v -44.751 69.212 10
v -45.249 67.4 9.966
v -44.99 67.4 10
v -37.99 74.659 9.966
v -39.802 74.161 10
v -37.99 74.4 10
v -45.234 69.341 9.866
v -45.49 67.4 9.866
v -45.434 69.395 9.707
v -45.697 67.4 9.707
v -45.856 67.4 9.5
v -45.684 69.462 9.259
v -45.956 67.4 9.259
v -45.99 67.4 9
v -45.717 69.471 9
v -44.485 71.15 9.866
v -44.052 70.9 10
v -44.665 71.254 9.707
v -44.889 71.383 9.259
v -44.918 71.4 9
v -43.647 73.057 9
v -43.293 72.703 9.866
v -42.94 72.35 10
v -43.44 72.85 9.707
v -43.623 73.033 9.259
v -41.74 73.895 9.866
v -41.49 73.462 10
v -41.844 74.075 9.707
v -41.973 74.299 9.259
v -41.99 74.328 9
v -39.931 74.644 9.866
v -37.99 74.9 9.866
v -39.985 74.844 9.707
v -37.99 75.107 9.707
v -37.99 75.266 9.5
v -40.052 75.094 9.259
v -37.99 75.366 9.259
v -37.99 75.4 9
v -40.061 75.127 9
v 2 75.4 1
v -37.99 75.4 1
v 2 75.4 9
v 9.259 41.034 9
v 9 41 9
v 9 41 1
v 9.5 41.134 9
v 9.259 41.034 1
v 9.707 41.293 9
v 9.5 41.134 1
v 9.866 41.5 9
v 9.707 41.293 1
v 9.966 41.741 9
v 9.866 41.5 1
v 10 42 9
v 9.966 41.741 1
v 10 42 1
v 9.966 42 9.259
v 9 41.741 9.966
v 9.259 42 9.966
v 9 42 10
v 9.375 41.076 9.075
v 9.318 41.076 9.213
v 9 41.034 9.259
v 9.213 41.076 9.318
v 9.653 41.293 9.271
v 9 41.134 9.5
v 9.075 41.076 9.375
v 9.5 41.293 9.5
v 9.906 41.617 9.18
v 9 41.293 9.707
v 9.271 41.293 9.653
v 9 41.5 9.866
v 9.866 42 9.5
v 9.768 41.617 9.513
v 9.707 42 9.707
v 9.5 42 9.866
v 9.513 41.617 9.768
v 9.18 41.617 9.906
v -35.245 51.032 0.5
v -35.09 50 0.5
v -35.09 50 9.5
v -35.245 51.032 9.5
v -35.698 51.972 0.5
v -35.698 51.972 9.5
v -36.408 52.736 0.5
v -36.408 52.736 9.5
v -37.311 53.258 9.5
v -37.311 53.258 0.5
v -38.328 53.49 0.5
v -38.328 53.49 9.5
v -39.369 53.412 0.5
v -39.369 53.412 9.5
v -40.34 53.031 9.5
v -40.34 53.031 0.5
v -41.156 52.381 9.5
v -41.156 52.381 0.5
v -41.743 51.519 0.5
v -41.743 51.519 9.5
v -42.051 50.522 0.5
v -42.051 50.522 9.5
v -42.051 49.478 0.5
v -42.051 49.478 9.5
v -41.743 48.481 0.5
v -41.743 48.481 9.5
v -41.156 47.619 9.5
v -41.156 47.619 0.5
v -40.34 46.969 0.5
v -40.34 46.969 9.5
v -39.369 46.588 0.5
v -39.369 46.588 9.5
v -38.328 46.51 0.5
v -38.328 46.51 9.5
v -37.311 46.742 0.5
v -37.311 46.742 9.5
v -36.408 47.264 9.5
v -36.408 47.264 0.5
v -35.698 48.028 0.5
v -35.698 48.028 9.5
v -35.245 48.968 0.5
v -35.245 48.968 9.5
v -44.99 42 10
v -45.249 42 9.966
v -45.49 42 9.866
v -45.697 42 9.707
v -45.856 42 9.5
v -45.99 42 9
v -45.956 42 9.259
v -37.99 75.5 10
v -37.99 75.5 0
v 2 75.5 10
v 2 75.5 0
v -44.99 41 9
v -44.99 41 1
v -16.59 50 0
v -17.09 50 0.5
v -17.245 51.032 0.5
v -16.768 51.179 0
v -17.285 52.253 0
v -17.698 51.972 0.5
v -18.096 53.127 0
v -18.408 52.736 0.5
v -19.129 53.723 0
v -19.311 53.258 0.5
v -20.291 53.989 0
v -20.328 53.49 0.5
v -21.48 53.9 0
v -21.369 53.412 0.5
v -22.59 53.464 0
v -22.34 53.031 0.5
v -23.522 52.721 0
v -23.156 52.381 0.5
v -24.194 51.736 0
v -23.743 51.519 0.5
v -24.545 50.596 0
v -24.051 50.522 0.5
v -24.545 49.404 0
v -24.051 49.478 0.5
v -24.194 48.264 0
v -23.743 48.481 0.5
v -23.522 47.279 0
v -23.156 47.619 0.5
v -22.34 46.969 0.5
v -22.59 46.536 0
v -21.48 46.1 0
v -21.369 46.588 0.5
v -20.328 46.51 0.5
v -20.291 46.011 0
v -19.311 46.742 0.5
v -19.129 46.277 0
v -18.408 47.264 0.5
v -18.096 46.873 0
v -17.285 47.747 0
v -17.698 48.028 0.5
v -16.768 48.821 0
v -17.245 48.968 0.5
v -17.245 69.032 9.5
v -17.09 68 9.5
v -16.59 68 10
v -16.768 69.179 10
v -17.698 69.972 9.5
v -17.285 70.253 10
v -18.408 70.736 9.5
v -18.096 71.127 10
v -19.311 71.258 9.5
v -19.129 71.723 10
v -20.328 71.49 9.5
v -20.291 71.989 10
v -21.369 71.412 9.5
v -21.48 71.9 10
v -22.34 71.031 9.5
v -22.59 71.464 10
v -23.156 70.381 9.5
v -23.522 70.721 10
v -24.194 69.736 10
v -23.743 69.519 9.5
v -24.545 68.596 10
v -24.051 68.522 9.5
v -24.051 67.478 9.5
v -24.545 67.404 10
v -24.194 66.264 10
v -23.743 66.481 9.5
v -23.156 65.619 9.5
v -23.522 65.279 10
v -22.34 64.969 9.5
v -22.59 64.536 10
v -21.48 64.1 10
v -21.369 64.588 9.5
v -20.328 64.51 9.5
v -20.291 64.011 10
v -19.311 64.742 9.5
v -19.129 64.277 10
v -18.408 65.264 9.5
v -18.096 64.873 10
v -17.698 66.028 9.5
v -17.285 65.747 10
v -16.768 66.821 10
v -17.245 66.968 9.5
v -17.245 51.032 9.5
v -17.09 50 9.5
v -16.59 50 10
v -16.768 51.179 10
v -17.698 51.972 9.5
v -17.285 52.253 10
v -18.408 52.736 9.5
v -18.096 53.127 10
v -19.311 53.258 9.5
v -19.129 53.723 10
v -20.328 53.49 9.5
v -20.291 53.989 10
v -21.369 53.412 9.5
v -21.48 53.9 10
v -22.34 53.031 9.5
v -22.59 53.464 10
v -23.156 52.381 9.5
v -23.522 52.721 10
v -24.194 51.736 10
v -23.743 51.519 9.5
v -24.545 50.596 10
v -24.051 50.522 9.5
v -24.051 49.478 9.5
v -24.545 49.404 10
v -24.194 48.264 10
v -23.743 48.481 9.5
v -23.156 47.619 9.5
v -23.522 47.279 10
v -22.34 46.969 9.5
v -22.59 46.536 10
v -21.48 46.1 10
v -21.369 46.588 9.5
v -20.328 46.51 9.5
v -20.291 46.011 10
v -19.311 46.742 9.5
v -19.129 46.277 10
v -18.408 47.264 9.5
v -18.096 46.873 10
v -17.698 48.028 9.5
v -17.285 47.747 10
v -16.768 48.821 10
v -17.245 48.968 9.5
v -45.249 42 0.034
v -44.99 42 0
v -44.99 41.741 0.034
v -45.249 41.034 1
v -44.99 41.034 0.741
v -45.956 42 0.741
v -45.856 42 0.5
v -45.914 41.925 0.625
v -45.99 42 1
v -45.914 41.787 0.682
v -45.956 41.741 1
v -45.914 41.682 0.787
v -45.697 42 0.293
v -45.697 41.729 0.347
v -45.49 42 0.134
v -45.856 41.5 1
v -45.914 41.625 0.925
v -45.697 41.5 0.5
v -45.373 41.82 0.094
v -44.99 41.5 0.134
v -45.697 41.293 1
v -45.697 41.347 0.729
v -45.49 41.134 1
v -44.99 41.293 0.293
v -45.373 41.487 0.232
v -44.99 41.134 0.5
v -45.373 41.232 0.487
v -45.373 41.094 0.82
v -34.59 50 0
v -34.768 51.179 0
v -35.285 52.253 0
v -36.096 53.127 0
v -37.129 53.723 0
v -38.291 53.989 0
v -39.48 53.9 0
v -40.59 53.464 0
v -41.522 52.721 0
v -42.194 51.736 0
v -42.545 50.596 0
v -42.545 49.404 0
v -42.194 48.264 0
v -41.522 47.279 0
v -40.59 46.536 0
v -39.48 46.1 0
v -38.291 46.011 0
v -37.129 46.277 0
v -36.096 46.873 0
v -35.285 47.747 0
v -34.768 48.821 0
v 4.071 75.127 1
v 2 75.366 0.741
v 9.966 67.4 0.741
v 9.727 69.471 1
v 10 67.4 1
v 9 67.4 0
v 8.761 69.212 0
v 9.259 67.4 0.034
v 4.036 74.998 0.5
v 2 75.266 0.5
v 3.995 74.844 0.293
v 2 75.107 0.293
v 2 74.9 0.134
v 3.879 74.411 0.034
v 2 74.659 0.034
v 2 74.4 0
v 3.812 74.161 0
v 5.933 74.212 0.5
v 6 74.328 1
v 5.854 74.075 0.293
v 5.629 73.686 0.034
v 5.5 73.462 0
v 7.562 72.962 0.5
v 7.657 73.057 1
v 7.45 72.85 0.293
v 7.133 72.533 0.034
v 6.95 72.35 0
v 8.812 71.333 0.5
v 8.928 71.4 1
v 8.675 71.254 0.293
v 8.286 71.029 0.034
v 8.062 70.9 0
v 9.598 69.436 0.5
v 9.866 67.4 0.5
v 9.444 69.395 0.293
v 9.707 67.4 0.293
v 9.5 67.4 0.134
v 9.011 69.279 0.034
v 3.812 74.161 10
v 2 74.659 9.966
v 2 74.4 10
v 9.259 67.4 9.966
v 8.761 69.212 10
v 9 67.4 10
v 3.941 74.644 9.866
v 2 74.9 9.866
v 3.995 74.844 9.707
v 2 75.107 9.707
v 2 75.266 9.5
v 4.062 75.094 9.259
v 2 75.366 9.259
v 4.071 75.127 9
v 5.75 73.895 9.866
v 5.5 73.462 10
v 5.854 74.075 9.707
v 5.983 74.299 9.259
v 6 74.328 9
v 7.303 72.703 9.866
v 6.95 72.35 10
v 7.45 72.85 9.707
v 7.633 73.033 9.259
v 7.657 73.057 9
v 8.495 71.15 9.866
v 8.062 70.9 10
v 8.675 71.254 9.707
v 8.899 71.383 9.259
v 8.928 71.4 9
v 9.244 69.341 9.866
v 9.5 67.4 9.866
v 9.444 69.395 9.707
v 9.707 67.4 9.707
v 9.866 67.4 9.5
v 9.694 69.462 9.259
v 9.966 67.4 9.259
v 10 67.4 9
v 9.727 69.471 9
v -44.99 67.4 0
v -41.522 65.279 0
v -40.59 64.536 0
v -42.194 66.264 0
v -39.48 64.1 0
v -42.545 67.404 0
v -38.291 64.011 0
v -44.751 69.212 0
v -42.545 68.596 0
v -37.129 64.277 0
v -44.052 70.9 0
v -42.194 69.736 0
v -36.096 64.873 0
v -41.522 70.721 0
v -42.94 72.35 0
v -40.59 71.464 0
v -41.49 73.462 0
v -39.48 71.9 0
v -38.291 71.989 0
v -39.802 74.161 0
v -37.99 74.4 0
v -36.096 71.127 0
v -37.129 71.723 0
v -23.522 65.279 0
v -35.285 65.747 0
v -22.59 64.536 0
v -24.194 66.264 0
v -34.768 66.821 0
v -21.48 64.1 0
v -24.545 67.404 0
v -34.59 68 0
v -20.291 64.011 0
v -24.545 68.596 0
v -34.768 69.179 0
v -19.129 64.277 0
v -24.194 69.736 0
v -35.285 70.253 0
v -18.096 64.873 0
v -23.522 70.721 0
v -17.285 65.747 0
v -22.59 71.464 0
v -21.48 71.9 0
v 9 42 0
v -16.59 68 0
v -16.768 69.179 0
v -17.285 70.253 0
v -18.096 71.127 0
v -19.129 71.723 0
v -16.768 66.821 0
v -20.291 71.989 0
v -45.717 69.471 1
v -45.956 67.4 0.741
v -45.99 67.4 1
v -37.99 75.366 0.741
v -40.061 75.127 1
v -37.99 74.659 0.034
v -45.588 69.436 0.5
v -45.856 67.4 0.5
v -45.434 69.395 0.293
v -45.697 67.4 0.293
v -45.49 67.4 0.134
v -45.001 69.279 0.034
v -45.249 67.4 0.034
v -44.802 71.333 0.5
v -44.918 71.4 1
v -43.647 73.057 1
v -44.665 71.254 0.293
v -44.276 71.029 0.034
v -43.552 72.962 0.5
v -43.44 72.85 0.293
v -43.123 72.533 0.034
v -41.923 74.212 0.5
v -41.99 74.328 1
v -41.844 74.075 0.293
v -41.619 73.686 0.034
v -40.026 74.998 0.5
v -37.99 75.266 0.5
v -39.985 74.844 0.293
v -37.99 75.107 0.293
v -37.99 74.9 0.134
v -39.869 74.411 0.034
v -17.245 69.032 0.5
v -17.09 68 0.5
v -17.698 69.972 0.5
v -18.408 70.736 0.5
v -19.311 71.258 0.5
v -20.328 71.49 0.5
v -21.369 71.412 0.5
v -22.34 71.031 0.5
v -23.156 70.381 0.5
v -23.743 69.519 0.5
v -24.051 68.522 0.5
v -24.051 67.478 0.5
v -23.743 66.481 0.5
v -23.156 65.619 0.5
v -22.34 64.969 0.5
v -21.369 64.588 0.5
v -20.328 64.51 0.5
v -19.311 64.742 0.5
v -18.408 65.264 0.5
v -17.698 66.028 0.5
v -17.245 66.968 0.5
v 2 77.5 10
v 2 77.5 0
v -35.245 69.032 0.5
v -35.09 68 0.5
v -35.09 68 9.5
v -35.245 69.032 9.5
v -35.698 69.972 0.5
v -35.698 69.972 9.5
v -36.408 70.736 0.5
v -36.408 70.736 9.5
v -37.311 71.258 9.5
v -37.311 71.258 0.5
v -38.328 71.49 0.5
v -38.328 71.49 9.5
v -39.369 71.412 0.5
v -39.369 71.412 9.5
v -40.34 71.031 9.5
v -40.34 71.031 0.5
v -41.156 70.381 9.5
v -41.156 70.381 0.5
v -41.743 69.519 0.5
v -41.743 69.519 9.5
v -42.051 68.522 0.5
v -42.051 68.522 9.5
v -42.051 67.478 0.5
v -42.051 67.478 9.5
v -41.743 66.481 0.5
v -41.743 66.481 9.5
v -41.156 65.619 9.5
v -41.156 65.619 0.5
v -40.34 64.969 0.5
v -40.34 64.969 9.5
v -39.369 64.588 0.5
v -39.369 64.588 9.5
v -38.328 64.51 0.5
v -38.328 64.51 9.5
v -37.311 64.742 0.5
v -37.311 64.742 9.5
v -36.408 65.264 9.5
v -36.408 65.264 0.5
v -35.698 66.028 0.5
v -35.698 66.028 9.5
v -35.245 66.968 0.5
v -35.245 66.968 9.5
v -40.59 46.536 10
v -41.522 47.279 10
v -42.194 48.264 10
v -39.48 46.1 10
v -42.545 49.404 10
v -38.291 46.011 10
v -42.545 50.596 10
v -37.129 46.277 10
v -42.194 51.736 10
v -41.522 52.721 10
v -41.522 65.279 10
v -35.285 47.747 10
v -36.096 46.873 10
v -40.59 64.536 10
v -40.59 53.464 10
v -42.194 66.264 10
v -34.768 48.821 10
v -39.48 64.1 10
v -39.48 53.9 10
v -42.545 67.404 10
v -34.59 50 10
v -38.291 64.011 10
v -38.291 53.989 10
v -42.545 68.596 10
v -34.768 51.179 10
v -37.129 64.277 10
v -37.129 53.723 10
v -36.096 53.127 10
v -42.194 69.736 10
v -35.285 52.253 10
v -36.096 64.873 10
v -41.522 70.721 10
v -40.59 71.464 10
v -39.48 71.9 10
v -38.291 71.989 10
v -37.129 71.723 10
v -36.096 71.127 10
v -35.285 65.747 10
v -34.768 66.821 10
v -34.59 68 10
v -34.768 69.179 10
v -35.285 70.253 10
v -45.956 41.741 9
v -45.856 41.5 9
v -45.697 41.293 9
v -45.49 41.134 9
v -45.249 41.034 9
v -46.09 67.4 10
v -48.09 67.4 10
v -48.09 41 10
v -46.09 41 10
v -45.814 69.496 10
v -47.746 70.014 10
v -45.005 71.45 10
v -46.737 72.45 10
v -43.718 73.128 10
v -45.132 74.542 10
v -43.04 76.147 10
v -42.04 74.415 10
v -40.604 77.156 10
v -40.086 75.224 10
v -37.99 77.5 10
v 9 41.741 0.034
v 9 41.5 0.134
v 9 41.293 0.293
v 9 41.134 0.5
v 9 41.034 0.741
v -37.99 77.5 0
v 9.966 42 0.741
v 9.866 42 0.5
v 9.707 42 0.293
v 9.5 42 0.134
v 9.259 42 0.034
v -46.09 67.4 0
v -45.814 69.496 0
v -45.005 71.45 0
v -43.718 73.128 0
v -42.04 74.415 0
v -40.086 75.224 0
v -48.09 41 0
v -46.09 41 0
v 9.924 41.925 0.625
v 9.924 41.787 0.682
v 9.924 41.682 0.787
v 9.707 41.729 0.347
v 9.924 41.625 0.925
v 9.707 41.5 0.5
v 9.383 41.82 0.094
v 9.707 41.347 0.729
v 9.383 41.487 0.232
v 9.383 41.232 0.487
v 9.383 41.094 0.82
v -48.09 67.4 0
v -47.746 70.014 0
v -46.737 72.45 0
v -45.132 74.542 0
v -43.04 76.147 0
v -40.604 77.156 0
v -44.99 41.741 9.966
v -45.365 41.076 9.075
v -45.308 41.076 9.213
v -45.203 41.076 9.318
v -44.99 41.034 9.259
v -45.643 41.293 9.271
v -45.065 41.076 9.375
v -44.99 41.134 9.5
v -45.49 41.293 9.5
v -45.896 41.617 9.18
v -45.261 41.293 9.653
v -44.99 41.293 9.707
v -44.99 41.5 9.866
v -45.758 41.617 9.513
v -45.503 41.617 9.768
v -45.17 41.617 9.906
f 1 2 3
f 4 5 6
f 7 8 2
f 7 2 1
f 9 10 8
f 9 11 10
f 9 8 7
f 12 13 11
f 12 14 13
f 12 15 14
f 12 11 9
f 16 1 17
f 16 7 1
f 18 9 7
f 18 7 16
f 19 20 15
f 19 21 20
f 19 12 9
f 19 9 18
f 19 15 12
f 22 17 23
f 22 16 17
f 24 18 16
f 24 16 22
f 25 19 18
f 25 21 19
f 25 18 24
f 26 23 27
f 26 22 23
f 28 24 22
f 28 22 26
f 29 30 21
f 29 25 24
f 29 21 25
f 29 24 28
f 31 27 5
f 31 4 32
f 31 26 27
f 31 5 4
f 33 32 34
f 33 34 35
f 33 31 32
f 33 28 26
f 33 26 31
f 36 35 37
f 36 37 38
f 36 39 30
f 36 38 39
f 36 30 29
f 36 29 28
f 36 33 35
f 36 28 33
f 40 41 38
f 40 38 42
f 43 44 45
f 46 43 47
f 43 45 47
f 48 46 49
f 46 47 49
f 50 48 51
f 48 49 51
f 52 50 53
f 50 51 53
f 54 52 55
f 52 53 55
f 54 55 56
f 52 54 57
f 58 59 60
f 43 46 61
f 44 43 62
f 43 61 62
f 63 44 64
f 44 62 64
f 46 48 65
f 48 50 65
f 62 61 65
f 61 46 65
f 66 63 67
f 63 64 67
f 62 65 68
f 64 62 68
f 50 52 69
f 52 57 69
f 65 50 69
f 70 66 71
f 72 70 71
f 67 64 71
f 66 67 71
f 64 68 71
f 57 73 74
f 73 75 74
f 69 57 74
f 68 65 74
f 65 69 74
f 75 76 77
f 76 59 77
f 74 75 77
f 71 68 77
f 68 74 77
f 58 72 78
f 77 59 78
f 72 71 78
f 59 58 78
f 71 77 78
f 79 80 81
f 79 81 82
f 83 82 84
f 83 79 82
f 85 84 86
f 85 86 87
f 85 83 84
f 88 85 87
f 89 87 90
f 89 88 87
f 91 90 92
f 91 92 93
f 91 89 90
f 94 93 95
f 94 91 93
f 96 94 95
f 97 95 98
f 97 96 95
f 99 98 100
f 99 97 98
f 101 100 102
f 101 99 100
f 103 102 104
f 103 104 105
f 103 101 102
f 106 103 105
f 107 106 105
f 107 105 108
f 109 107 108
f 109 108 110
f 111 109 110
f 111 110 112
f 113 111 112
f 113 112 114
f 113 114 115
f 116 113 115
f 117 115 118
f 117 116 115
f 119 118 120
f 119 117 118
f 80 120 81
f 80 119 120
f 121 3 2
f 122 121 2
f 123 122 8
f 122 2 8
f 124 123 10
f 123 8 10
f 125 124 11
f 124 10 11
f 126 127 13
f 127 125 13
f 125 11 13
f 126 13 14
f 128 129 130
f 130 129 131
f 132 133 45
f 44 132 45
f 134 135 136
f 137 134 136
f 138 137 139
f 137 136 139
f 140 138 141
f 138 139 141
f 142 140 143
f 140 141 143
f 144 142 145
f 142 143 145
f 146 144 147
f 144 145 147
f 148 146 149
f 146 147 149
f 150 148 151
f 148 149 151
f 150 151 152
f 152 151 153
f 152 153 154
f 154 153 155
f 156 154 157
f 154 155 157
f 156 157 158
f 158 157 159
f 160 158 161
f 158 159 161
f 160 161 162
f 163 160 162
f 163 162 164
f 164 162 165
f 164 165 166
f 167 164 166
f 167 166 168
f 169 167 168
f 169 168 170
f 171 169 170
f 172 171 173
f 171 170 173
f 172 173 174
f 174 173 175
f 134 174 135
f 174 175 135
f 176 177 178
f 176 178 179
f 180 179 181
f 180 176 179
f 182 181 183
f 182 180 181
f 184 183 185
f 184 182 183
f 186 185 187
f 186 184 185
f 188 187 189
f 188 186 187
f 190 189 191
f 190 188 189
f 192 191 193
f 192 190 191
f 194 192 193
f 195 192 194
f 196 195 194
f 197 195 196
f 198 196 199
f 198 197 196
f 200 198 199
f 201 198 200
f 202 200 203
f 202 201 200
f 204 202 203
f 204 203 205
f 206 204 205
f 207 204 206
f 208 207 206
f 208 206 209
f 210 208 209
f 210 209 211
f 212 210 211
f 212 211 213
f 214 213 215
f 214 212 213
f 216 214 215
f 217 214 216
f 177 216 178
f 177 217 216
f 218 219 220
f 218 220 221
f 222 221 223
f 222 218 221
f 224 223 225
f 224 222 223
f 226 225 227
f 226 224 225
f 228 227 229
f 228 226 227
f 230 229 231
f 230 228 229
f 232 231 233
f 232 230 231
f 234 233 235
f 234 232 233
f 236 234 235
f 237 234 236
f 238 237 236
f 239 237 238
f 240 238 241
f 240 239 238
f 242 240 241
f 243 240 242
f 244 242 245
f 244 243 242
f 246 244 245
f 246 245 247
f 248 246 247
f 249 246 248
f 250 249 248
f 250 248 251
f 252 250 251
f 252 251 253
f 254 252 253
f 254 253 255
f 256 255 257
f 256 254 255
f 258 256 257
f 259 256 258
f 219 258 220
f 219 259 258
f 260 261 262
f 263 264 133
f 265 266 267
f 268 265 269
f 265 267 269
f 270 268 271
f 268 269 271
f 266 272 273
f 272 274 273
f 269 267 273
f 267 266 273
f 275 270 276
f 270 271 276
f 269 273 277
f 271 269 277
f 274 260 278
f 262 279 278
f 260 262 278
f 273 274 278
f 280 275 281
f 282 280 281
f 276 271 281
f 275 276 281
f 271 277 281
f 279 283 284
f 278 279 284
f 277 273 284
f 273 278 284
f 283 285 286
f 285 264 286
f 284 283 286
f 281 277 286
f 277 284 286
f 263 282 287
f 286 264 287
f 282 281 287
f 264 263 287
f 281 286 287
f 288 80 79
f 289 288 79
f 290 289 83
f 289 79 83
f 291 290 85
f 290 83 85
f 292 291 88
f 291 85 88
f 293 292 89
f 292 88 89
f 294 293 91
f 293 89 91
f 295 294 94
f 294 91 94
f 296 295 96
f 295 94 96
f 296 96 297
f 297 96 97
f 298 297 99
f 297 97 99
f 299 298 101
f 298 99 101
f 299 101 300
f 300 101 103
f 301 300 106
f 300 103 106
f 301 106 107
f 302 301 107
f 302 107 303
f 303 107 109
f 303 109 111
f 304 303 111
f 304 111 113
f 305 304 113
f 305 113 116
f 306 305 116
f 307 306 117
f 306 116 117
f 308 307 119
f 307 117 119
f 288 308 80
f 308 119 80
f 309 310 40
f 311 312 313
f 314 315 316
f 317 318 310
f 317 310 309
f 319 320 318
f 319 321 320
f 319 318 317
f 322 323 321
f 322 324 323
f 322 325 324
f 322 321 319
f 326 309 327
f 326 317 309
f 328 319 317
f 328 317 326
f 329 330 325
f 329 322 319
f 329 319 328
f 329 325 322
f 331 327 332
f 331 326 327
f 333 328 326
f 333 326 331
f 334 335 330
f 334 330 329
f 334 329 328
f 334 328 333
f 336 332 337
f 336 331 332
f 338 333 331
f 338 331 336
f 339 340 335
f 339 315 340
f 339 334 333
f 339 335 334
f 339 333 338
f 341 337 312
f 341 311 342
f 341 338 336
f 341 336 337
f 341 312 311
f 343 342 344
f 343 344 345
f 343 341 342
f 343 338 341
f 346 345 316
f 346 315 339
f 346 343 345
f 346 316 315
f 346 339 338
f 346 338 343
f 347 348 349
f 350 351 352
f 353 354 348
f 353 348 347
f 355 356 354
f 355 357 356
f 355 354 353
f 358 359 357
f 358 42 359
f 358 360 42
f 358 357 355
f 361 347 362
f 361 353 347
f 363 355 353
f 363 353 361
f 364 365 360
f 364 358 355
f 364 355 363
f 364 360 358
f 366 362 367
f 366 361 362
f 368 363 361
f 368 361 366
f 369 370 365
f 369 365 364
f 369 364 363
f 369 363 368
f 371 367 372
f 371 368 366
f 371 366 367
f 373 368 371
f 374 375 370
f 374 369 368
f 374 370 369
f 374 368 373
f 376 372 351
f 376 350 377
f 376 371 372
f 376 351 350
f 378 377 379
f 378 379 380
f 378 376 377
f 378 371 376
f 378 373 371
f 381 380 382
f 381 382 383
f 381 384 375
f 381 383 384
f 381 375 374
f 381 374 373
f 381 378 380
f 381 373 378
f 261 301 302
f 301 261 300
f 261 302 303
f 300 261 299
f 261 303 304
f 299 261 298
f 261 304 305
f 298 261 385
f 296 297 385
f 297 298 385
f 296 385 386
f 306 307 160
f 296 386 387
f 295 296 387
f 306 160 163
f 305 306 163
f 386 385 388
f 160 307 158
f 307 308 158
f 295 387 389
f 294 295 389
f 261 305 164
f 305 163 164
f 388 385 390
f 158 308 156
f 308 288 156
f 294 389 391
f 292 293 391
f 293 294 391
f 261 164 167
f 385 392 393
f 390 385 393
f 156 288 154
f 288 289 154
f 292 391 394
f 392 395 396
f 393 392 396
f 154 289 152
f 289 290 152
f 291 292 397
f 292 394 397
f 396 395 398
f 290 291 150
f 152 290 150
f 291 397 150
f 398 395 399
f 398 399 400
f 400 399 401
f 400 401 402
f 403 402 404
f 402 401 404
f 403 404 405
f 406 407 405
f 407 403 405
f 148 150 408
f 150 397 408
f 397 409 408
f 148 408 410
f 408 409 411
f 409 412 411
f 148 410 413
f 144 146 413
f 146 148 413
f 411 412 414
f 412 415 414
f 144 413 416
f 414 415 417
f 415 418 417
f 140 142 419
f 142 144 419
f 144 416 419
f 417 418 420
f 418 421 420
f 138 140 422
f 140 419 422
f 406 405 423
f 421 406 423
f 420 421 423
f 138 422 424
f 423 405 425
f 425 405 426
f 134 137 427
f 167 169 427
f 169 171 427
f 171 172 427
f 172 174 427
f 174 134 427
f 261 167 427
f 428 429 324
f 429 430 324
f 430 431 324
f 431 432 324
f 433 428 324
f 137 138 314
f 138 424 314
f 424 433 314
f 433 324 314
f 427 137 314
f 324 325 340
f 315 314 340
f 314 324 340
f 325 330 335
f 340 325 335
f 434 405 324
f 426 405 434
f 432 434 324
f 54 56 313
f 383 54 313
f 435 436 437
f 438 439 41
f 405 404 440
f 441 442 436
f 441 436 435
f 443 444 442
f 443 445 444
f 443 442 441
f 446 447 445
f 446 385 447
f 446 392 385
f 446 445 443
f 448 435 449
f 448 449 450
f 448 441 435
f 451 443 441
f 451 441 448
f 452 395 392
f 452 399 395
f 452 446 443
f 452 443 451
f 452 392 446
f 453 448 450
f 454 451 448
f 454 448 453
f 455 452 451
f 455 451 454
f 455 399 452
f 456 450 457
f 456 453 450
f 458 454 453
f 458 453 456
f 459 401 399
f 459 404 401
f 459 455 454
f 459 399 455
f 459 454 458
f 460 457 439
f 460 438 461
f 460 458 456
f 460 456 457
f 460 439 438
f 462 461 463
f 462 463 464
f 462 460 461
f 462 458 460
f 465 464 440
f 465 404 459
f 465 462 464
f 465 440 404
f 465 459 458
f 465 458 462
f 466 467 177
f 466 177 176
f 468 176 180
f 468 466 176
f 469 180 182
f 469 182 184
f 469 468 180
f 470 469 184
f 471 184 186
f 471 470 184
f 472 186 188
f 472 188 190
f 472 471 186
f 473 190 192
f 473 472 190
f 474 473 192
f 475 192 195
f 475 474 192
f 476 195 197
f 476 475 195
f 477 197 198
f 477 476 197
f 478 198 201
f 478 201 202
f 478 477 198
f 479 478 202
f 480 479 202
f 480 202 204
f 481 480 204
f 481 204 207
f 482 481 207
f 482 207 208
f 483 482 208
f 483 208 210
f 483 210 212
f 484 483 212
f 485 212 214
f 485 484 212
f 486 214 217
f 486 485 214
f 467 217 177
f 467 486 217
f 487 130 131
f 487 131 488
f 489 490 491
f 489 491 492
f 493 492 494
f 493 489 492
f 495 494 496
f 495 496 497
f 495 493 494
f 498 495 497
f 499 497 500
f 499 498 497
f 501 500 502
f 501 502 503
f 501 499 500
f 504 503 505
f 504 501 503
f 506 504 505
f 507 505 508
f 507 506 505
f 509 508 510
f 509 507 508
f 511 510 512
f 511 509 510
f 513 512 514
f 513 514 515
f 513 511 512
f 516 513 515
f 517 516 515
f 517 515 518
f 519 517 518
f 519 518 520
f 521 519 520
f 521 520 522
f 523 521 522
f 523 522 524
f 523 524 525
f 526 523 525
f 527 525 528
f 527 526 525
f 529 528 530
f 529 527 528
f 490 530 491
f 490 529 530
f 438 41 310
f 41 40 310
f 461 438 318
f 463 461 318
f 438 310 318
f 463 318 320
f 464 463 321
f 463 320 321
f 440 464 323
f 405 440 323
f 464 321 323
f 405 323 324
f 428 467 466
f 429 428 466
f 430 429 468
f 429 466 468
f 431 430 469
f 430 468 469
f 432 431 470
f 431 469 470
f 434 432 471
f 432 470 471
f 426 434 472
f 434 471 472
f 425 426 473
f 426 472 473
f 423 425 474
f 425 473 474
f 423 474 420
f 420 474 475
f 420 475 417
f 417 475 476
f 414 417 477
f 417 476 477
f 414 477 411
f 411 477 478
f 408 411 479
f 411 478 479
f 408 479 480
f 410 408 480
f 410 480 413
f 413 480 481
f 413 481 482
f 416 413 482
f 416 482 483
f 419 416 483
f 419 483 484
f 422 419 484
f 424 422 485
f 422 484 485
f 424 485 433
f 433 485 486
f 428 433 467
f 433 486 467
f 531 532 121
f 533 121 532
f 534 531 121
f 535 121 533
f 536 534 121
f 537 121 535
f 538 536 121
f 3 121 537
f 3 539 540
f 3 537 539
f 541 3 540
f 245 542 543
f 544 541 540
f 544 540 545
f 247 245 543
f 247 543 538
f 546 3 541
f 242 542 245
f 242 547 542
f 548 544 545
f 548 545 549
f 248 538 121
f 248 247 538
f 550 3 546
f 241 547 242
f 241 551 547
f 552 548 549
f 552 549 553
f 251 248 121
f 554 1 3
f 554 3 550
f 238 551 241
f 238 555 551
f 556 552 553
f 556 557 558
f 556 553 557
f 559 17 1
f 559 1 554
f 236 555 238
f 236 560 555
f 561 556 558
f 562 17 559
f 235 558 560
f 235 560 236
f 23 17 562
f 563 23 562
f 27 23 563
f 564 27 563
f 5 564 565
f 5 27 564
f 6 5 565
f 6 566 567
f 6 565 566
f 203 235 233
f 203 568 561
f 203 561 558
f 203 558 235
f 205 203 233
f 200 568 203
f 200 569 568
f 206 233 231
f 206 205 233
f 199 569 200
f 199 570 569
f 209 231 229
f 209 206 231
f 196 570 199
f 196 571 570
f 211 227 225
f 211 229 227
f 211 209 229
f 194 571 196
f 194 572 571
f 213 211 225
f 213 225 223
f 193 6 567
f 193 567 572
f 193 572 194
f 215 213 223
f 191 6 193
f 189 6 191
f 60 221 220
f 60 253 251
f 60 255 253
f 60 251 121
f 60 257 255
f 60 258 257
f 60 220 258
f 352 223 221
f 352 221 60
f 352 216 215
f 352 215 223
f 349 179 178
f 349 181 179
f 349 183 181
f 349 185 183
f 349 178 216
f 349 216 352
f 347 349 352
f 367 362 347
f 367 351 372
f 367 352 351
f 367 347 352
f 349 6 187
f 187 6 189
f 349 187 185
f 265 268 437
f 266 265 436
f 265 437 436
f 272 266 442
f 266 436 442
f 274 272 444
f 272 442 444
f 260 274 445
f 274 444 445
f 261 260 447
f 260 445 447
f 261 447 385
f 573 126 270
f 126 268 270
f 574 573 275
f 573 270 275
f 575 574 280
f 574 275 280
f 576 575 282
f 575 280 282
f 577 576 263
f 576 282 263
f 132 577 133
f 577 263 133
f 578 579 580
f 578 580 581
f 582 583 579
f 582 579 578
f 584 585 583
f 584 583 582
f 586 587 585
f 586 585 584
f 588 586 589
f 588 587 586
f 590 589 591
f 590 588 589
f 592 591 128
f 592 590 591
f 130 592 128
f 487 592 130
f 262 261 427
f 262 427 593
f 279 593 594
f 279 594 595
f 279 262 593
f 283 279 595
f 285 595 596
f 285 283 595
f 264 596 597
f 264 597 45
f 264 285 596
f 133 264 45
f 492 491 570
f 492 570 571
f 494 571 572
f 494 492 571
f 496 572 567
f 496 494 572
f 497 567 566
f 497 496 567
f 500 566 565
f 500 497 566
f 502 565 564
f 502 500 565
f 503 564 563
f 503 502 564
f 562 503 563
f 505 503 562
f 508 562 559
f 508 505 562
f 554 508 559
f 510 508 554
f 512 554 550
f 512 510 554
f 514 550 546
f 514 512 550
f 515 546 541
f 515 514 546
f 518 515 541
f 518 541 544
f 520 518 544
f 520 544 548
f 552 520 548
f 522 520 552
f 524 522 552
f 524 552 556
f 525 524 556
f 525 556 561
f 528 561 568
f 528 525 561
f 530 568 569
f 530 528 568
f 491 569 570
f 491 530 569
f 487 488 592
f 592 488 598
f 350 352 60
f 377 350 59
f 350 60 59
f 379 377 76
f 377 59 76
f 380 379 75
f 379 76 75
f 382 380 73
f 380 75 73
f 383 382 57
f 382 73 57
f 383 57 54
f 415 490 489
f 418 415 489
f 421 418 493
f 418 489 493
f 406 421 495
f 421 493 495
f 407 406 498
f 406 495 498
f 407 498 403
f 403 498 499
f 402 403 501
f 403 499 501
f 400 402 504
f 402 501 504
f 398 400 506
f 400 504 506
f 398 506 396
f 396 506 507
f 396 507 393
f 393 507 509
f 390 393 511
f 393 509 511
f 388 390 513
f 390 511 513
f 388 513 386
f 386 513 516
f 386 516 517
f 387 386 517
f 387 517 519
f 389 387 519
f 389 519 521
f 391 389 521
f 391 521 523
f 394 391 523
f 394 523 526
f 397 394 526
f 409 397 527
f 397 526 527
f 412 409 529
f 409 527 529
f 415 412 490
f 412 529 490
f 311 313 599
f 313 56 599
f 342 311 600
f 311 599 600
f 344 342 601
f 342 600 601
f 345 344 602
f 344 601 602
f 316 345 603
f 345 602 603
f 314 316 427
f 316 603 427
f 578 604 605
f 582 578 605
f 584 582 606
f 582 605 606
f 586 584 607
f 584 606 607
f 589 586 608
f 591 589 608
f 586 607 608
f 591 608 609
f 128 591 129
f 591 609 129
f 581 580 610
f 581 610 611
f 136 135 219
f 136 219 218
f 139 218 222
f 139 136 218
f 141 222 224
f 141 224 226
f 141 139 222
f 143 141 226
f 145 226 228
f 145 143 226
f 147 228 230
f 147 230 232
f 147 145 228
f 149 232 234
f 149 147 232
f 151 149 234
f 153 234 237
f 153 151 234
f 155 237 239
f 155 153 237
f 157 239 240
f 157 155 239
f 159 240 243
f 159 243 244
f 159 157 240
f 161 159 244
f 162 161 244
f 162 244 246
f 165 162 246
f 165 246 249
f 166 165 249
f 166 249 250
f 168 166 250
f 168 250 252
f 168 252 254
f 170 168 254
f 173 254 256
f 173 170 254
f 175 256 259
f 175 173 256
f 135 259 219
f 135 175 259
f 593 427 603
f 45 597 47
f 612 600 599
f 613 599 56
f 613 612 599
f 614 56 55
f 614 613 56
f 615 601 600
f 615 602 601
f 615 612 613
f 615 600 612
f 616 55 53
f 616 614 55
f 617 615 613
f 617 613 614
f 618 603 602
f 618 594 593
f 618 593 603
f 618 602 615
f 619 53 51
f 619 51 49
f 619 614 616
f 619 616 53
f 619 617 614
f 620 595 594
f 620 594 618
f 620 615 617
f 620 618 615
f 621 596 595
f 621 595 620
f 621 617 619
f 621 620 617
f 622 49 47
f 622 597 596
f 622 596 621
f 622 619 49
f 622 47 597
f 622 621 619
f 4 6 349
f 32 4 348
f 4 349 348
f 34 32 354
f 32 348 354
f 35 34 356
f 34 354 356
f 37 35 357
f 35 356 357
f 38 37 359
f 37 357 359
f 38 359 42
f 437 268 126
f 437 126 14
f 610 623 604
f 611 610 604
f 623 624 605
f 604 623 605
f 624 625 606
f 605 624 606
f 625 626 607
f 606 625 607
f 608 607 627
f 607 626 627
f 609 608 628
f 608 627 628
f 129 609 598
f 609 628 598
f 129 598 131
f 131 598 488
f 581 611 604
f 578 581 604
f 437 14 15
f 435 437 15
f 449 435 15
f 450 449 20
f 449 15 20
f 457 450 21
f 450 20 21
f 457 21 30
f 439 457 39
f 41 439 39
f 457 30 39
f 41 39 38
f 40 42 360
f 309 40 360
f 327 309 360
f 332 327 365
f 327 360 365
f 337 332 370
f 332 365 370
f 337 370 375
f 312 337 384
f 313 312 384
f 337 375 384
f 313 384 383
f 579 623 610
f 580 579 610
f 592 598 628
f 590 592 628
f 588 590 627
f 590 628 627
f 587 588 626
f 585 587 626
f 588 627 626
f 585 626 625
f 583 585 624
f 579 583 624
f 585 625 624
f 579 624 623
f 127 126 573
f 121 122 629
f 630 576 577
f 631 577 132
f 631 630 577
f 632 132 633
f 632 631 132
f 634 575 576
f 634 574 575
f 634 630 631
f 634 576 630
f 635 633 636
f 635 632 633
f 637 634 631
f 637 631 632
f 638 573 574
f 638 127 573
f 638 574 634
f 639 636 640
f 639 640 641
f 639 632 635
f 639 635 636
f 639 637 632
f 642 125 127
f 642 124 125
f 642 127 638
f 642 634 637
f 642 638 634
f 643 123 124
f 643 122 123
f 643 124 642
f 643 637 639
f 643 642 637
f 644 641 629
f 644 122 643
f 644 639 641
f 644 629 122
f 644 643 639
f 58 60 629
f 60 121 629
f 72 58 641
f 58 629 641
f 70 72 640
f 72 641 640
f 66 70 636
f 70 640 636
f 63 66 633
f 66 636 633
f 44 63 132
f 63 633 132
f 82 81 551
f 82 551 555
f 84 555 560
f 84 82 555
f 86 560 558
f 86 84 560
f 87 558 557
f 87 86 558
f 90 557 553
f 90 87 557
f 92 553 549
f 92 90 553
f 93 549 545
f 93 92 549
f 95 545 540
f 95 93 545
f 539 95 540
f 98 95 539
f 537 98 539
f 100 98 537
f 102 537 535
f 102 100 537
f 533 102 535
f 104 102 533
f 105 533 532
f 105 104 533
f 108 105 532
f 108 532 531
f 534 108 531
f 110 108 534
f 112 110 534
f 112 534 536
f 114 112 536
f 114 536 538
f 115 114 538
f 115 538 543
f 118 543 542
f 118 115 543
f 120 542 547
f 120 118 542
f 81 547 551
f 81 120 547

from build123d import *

# Parameters (mm, degrees)
SKETCH1_W           = 55.99
SKETCH1_H           = 87.9
SKETCH1_R           = 3.5
BOSS_EXTRUDE1_DEPTH = 10
FILLET1_R           = 8
FILLET2_R           = 1
CHAMFER1_SIZE       = 0.5
BOSS_EXTRUDE2_DEPTH = 10


# Read off the part's stored shape, not the designer's step: Split1
with BuildPart() as part:
    # Sketch1 → Boss-Extrude1 (new body)
    with BuildSketch(Plane.XY):
        with Locations((-17.995, 31.45)):
            Rectangle(SKETCH1_W, SKETCH1_H)
        Circle(SKETCH1_R, mode=Mode.SUBTRACT)
        with Locations((-6.59, 32)):
            Circle(SKETCH1_R, mode=Mode.SUBTRACT)
        with Locations((-20.59, 32)):
            Circle(SKETCH1_R, mode=Mode.SUBTRACT)
        with Locations((-14, 0)):
            Circle(SKETCH1_R, mode=Mode.SUBTRACT)
        with Locations((-20.59, 50)):
            Circle(SKETCH1_R, mode=Mode.SUBTRACT)
        with Locations((-20.59, 68)):
            Circle(SKETCH1_R, mode=Mode.SUBTRACT)
        with Locations((-38.59, 68)):
            Circle(SKETCH1_R, mode=Mode.SUBTRACT)
        with Locations((-38.59, 50)):
            Circle(SKETCH1_R, mode=Mode.SUBTRACT)
    extrude(amount=BOSS_EXTRUDE1_DEPTH)

    # Fillet1
    fillet1_edges = [part.edges().sort_by_distance(p)[0] for p in [
        (-45.99, -12.5, 5),
        (-45.99, 75.4, 5),
        (10, 75.4, 5),
        (10, -12.5, 5),
    ]]
    fillet(fillet1_edges, radius=FILLET1_R)


with BuildPart() as body_2:
    # Split1: the piece on the far side of the plane
    add(part.part)
    split(bisect_by=Plane(origin=(0, 41, 0), x_dir=(1, 0, 0), z_dir=(0, 1, 0)), keep=Keep.BOTTOM)


with BuildPart() as part_1:
    add(part.part)

    # Split1
    split(bisect_by=Plane(origin=(0, 41, 0), x_dir=(1, 0, 0), z_dir=(0, 1, 0)), keep=Keep.TOP)

    # Fillet2
    fillet2_edges = [part_1.edges().sort_by_distance(p)[0] for p in [
        (-17.995, 41, 0),
        (-45.99, 54.2, 0),
        (-17.995, 75.4, 0),
        (7.656854249, 73.056854249, 0),
        (-43.646854249, 73.056854249, 0),
        (-17.995, 75.4, 10),
        (-45.99, 54.2, 10),
        (7.656854249, 73.056854249, 10),
        (-43.646854249, 73.056854249, 10),
        (-45.99, 41, 5),
        (10, 54.2, 10),
        (10, 54.2, 0),
        (10, 41, 5),
        (-17.995, 41, 10),
    ]]
    fillet(fillet2_edges, radius=FILLET2_R)

    # Chamfer1
    chamfer1_edges = [part_1.edges().sort_by_distance(p)[0] for p in [
        (-24.09, 50, 0),
        (-24.09, 50, 10),
        (-24.09, 68, 0),
        (-24.09, 68, 10),
        (-42.09, 68, 0),
        (-42.09, 68, 10),
        (-42.09, 50, 0),
        (-42.09, 50, 10),
    ]]
    chamfer(chamfer1_edges, length=CHAMFER1_SIZE)


with BuildPart() as body_2_2:
    # Sketch4 → Boss-Extrude2 (new body)
    with BuildSketch(Plane.XY):
        with BuildLine():
            Line((2, 77.5), (-37.99, 77.5))
            ThreePointArc((-37.99, 77.5), (-45.13177849, 74.54177849), (-48.09, 67.4))
            Line((-48.09, 67.4), (-48.09, 41))
            Line((-48.09, 41), (-46.09, 41))
            Line((-46.09, 41), (-46.09, 67.4))
            ThreePointArc((-46.09, 67.4), (-43.717564928, 73.127564928), (-37.99, 75.5))
            Line((-37.99, 75.5), (2, 75.5))
            Line((2, 75.5), (2, 77.5))
        make_face()
    extrude(amount=BOSS_EXTRUDE2_DEPTH)


solid = Compound([part_1.part, body_2_2.part])
